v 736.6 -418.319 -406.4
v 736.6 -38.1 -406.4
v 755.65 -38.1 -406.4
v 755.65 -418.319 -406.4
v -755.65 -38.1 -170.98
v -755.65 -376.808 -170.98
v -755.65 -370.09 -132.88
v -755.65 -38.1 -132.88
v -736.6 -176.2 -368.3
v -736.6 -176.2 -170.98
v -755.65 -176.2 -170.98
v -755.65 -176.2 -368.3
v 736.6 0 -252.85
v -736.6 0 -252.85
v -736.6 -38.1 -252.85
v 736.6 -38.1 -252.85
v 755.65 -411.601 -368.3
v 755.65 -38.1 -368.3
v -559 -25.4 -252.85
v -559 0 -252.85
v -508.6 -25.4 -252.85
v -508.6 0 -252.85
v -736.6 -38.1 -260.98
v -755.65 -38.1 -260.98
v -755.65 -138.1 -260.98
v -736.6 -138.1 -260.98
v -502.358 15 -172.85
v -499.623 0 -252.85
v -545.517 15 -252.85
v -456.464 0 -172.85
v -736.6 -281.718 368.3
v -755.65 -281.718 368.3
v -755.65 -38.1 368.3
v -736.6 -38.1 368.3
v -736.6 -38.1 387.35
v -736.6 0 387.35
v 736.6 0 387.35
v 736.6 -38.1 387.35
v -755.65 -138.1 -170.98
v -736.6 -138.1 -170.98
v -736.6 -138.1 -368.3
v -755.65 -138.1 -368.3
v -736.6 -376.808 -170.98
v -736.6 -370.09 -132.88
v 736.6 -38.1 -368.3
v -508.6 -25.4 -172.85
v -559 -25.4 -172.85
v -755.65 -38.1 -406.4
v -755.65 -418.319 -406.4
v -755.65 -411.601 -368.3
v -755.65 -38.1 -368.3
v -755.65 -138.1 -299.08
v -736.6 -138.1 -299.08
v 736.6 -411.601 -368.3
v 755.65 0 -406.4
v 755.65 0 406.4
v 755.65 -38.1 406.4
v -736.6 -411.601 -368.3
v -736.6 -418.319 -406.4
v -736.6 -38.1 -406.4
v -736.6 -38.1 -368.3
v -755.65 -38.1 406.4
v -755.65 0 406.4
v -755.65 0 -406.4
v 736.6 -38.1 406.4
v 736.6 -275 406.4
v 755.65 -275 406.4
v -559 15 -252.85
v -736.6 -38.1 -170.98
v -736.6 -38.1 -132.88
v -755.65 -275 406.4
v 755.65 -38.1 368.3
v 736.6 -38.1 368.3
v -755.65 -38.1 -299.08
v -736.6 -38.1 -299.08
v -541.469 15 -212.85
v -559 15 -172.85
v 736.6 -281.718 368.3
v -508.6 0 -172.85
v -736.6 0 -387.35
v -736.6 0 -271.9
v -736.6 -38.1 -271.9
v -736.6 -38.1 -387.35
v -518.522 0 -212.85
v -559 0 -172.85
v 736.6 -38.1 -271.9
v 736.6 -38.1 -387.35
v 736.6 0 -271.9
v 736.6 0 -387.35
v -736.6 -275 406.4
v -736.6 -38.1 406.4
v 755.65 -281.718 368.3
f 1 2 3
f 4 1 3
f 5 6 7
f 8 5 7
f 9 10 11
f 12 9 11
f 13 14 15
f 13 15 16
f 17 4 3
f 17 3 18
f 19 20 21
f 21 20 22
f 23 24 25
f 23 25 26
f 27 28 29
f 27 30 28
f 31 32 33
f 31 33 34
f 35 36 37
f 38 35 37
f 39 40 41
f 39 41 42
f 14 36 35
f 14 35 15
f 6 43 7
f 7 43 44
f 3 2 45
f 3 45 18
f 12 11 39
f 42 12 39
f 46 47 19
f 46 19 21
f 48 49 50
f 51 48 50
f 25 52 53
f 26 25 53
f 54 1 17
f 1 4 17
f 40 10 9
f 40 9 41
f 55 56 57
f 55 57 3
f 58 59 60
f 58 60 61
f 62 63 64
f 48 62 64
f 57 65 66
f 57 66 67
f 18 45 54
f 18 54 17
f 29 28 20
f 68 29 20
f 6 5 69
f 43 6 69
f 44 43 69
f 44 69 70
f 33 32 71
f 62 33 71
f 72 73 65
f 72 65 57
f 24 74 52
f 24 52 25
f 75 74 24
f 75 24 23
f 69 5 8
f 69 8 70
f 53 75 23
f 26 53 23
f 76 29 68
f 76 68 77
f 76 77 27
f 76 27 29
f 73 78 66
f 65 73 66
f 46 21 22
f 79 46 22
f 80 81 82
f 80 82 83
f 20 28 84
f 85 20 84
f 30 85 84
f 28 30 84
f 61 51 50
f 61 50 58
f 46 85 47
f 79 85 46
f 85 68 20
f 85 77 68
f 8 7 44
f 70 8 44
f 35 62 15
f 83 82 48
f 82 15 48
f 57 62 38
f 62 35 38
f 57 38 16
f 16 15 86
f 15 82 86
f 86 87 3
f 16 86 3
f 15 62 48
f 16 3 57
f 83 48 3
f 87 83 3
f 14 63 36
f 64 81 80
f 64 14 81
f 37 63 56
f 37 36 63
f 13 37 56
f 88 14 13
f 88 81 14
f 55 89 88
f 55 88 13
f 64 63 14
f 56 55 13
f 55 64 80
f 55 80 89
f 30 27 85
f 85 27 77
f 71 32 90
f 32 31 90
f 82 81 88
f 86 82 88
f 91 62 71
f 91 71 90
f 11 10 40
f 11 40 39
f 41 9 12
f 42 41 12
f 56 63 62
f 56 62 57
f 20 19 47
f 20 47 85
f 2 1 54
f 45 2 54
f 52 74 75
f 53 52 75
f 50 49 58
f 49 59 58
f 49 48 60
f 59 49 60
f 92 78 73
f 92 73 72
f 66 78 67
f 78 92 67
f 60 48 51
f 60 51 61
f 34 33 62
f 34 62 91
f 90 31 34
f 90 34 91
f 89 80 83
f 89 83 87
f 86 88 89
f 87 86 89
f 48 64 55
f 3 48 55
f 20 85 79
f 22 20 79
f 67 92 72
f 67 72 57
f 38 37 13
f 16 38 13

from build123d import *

# Parameters (mm, degrees)
SKETCH22_W          = 1511.3
SKETCH22_H          = 812.8
SKETCH22_W_2        = 1473.2
SKETCH22_H_2        = 774.7
BOSS_EXTRUDE3_DEPTH = 38.1
BOSS_EXTRUDE4_REACH = 860.848
SKETCH23_W          = 19.05
SKETCH23_H          = 38.1
BOSS_EXTRUDE5_REACH = 893.918
SKETCH24_W          = 19.05
SKETCH24_H          = 38.1
SKETCH26_W          = 1473.2
SKETCH26_H          = 19.05
BOSS_EXTRUDE6_DEPTH = 38.1
SKETCH27_W          = 19.05
SKETCH27_H          = 38.1
BOSS_EXTRUDE7_DEPTH = 197.32
SKETCH29_W          = 19.05
SKETCH29_H          = 38.1
BOSS_EXTRUDE8_DEPTH = 100
SKETCH30_W          = 50.4
SKETCH30_H          = 25.4
BOSS_EXTRUDE9_DEPTH = 80


with BuildPart() as part:
    # Sketch22 → Boss-Extrude3 (new body)
    with BuildSketch(Plane(origin=(0, 0, 0), x_dir=(1, 0, 0), z_dir=(0, 1, 0))):
        Rectangle(SKETCH22_W, SKETCH22_H)
        Rectangle(SKETCH22_W_2, SKETCH22_H_2, mode=Mode.SUBTRACT)
    extrude(amount=-BOSS_EXTRUDE3_DEPTH)

    # Sketch26 → Boss-Extrude6 (add)
    with BuildSketch(Plane(origin=(0, 0, 0), x_dir=(1, 0, 0), z_dir=(0, 1, 0))):
        with Locations((0, 262.375)):
            Rectangle(SKETCH26_W, SKETCH26_H)
    extrude(amount=-BOSS_EXTRUDE6_DEPTH)


with BuildPart() as body_2:
    # Boss-Extrude4: up to this plane
    boss_extrude4_end = Plane(origin=(0, -336.206228482, 59.282229164), z_dir=(0, 0.984807753012208, -0.17364817766693072))
    # Sketch23 → Boss-Extrude4 (new, up to the surface)
    with BuildSketch(Plane.XZ.offset(38.1), mode=Mode.PRIVATE) as boss_extrude4_sk1:
        with Locations((-746.125, 387.35)):
            Rectangle(SKETCH23_W, SKETCH23_H)
    boss_extrude4_tool1 = split(extrude(boss_extrude4_sk1.sketch, amount=BOSS_EXTRUDE4_REACH, mode=Mode.PRIVATE), bisect_by=boss_extrude4_end, keep=Keep.BOTH, mode=Mode.PRIVATE)
    add(boss_extrude4_tool1.solids().sort_by_distance((-746.125, -38.1, 387.35))[0])
    # Sketch23 → Boss-Extrude4 (new, up to the surface)
    with BuildSketch(Plane.XZ.offset(38.1), mode=Mode.PRIVATE) as boss_extrude4_sk2:
        with Locations((746.125, 387.35)):
            Rectangle(SKETCH23_W, SKETCH23_H)
    boss_extrude4_tool2 = split(extrude(boss_extrude4_sk2.sketch, amount=BOSS_EXTRUDE4_REACH, mode=Mode.PRIVATE), bisect_by=boss_extrude4_end, keep=Keep.BOTH, mode=Mode.PRIVATE)
    add(boss_extrude4_tool2.solids().sort_by_distance((746.125, -38.1, 387.35))[0])


with BuildPart() as body_3:
    # Boss-Extrude5: up to this plane
    boss_extrude5_end = Plane(origin=(0, -336.206228482, 59.282229164), z_dir=(0, 0.984807753012208, -0.17364817766693072))
    # Sketch24 → Boss-Extrude5 (new, up to the surface)
    with BuildSketch(Plane.XZ.offset(38.1), mode=Mode.PRIVATE) as boss_extrude5_sk1:
        with Locations((-746.125, -387.35)):
            Rectangle(SKETCH24_W, SKETCH24_H)
    boss_extrude5_tool1 = split(extrude(boss_extrude5_sk1.sketch, amount=BOSS_EXTRUDE5_REACH, mode=Mode.PRIVATE), bisect_by=boss_extrude5_end, keep=Keep.BOTH, mode=Mode.PRIVATE)
    add(boss_extrude5_tool1.solids().sort_by_distance((-746.125, -38.1, -387.35))[0])
    # Sketch24 → Boss-Extrude5 (new, up to the surface)
    with BuildSketch(Plane.XZ.offset(38.1), mode=Mode.PRIVATE) as boss_extrude5_sk2:
        with Locations((746.125, -387.35)):
            Rectangle(SKETCH24_W, SKETCH24_H)
    boss_extrude5_tool2 = split(extrude(boss_extrude5_sk2.sketch, amount=BOSS_EXTRUDE5_REACH, mode=Mode.PRIVATE), bisect_by=boss_extrude5_end, keep=Keep.BOTH, mode=Mode.PRIVATE)
    add(boss_extrude5_tool2.solids().sort_by_distance((746.125, -38.1, -387.35))[0])
    # Sketch24 → Boss-Extrude5 (new, up to the surface)
    with BuildSketch(Plane.XZ.offset(38.1), mode=Mode.PRIVATE) as boss_extrude5_sk3:
        with Locations((-746.125, -151.93)):
            Rectangle(SKETCH24_W, SKETCH24_H)
    boss_extrude5_tool3 = split(extrude(boss_extrude5_sk3.sketch, amount=BOSS_EXTRUDE5_REACH, mode=Mode.PRIVATE), bisect_by=boss_extrude5_end, keep=Keep.BOTH, mode=Mode.PRIVATE)
    add(boss_extrude5_tool3.solids().sort_by_distance((-746.125, -38.1, -151.93))[0])


with BuildPart() as body_4:
    # Sketch27 → Boss-Extrude7 (new body)
    with BuildSketch(Plane(origin=(0, 0, -170.98), x_dir=(-1, 0, 0), z_dir=(0, 0, -1))):
        with Locations((746.125, -157.15)):
            Rectangle(SKETCH27_W, SKETCH27_H)
    extrude(amount=BOSS_EXTRUDE7_DEPTH)


with BuildPart() as body_5:
    # Sketch29 → Boss-Extrude8 (new body)
    with BuildSketch(Plane.XZ.offset(38.1)):
        with Locations((-746.125, -280.03)):
            Rectangle(SKETCH29_W, SKETCH29_H)
    extrude(amount=BOSS_EXTRUDE8_DEPTH)


with BuildPart() as body_6:
    # Sketch30 → Boss-Extrude9 (new body)
    with BuildSketch(Plane.XY.offset(-252.85)):
        with Locations((-533.8, -12.7)):
            Rectangle(SKETCH30_W, SKETCH30_H)
    extrude(amount=BOSS_EXTRUDE9_DEPTH)


with BuildPart() as body_7:
    # Boss-Extrude11: read off the stored shape, not the designer's step
    # Boss-Extrude11: loft between two sections, ruled curve by curve
    boss_extrude11_from = [
        Edge.make_line((-499.623008206, 0, -252.85), (-559, 0, -252.85)),
        Edge.make_line((-545.516767314, 15, -252.85), (-559, 15, -252.85)),
        Edge.make_line((-559, 15, -252.85), (-559, 0, -252.85)),
        Edge.make_line((-499.623008206, 0, -252.85), (-545.516767314, 15, -252.85)),
    ]
    boss_extrude11_to = [
        Edge.make_line((-456.46403233, 0, -172.85), (-559, 0, -172.85)),
        Edge.make_line((-502.357791437, 15, -172.85), (-559, 15, -172.85)),
        Edge.make_line((-559, 15, -172.85), (-559, 0, -172.85)),
        Edge.make_line((-456.46403233, 0, -172.85), (-502.357791437, 15, -172.85)),
    ]
    boss_extrude11 = Solid(Shell([*[Face.make_surface_from_curves(boss_extrude11_from[k], boss_extrude11_to[k]) for k in range(4)], Face(Wire(boss_extrude11_from)), Face(Wire(boss_extrude11_to))]))
    add(boss_extrude11)


solid = Compound([part.part, body_2.part, body_3.part, body_4.part, body_5.part, body_6.part, body_7.part])
